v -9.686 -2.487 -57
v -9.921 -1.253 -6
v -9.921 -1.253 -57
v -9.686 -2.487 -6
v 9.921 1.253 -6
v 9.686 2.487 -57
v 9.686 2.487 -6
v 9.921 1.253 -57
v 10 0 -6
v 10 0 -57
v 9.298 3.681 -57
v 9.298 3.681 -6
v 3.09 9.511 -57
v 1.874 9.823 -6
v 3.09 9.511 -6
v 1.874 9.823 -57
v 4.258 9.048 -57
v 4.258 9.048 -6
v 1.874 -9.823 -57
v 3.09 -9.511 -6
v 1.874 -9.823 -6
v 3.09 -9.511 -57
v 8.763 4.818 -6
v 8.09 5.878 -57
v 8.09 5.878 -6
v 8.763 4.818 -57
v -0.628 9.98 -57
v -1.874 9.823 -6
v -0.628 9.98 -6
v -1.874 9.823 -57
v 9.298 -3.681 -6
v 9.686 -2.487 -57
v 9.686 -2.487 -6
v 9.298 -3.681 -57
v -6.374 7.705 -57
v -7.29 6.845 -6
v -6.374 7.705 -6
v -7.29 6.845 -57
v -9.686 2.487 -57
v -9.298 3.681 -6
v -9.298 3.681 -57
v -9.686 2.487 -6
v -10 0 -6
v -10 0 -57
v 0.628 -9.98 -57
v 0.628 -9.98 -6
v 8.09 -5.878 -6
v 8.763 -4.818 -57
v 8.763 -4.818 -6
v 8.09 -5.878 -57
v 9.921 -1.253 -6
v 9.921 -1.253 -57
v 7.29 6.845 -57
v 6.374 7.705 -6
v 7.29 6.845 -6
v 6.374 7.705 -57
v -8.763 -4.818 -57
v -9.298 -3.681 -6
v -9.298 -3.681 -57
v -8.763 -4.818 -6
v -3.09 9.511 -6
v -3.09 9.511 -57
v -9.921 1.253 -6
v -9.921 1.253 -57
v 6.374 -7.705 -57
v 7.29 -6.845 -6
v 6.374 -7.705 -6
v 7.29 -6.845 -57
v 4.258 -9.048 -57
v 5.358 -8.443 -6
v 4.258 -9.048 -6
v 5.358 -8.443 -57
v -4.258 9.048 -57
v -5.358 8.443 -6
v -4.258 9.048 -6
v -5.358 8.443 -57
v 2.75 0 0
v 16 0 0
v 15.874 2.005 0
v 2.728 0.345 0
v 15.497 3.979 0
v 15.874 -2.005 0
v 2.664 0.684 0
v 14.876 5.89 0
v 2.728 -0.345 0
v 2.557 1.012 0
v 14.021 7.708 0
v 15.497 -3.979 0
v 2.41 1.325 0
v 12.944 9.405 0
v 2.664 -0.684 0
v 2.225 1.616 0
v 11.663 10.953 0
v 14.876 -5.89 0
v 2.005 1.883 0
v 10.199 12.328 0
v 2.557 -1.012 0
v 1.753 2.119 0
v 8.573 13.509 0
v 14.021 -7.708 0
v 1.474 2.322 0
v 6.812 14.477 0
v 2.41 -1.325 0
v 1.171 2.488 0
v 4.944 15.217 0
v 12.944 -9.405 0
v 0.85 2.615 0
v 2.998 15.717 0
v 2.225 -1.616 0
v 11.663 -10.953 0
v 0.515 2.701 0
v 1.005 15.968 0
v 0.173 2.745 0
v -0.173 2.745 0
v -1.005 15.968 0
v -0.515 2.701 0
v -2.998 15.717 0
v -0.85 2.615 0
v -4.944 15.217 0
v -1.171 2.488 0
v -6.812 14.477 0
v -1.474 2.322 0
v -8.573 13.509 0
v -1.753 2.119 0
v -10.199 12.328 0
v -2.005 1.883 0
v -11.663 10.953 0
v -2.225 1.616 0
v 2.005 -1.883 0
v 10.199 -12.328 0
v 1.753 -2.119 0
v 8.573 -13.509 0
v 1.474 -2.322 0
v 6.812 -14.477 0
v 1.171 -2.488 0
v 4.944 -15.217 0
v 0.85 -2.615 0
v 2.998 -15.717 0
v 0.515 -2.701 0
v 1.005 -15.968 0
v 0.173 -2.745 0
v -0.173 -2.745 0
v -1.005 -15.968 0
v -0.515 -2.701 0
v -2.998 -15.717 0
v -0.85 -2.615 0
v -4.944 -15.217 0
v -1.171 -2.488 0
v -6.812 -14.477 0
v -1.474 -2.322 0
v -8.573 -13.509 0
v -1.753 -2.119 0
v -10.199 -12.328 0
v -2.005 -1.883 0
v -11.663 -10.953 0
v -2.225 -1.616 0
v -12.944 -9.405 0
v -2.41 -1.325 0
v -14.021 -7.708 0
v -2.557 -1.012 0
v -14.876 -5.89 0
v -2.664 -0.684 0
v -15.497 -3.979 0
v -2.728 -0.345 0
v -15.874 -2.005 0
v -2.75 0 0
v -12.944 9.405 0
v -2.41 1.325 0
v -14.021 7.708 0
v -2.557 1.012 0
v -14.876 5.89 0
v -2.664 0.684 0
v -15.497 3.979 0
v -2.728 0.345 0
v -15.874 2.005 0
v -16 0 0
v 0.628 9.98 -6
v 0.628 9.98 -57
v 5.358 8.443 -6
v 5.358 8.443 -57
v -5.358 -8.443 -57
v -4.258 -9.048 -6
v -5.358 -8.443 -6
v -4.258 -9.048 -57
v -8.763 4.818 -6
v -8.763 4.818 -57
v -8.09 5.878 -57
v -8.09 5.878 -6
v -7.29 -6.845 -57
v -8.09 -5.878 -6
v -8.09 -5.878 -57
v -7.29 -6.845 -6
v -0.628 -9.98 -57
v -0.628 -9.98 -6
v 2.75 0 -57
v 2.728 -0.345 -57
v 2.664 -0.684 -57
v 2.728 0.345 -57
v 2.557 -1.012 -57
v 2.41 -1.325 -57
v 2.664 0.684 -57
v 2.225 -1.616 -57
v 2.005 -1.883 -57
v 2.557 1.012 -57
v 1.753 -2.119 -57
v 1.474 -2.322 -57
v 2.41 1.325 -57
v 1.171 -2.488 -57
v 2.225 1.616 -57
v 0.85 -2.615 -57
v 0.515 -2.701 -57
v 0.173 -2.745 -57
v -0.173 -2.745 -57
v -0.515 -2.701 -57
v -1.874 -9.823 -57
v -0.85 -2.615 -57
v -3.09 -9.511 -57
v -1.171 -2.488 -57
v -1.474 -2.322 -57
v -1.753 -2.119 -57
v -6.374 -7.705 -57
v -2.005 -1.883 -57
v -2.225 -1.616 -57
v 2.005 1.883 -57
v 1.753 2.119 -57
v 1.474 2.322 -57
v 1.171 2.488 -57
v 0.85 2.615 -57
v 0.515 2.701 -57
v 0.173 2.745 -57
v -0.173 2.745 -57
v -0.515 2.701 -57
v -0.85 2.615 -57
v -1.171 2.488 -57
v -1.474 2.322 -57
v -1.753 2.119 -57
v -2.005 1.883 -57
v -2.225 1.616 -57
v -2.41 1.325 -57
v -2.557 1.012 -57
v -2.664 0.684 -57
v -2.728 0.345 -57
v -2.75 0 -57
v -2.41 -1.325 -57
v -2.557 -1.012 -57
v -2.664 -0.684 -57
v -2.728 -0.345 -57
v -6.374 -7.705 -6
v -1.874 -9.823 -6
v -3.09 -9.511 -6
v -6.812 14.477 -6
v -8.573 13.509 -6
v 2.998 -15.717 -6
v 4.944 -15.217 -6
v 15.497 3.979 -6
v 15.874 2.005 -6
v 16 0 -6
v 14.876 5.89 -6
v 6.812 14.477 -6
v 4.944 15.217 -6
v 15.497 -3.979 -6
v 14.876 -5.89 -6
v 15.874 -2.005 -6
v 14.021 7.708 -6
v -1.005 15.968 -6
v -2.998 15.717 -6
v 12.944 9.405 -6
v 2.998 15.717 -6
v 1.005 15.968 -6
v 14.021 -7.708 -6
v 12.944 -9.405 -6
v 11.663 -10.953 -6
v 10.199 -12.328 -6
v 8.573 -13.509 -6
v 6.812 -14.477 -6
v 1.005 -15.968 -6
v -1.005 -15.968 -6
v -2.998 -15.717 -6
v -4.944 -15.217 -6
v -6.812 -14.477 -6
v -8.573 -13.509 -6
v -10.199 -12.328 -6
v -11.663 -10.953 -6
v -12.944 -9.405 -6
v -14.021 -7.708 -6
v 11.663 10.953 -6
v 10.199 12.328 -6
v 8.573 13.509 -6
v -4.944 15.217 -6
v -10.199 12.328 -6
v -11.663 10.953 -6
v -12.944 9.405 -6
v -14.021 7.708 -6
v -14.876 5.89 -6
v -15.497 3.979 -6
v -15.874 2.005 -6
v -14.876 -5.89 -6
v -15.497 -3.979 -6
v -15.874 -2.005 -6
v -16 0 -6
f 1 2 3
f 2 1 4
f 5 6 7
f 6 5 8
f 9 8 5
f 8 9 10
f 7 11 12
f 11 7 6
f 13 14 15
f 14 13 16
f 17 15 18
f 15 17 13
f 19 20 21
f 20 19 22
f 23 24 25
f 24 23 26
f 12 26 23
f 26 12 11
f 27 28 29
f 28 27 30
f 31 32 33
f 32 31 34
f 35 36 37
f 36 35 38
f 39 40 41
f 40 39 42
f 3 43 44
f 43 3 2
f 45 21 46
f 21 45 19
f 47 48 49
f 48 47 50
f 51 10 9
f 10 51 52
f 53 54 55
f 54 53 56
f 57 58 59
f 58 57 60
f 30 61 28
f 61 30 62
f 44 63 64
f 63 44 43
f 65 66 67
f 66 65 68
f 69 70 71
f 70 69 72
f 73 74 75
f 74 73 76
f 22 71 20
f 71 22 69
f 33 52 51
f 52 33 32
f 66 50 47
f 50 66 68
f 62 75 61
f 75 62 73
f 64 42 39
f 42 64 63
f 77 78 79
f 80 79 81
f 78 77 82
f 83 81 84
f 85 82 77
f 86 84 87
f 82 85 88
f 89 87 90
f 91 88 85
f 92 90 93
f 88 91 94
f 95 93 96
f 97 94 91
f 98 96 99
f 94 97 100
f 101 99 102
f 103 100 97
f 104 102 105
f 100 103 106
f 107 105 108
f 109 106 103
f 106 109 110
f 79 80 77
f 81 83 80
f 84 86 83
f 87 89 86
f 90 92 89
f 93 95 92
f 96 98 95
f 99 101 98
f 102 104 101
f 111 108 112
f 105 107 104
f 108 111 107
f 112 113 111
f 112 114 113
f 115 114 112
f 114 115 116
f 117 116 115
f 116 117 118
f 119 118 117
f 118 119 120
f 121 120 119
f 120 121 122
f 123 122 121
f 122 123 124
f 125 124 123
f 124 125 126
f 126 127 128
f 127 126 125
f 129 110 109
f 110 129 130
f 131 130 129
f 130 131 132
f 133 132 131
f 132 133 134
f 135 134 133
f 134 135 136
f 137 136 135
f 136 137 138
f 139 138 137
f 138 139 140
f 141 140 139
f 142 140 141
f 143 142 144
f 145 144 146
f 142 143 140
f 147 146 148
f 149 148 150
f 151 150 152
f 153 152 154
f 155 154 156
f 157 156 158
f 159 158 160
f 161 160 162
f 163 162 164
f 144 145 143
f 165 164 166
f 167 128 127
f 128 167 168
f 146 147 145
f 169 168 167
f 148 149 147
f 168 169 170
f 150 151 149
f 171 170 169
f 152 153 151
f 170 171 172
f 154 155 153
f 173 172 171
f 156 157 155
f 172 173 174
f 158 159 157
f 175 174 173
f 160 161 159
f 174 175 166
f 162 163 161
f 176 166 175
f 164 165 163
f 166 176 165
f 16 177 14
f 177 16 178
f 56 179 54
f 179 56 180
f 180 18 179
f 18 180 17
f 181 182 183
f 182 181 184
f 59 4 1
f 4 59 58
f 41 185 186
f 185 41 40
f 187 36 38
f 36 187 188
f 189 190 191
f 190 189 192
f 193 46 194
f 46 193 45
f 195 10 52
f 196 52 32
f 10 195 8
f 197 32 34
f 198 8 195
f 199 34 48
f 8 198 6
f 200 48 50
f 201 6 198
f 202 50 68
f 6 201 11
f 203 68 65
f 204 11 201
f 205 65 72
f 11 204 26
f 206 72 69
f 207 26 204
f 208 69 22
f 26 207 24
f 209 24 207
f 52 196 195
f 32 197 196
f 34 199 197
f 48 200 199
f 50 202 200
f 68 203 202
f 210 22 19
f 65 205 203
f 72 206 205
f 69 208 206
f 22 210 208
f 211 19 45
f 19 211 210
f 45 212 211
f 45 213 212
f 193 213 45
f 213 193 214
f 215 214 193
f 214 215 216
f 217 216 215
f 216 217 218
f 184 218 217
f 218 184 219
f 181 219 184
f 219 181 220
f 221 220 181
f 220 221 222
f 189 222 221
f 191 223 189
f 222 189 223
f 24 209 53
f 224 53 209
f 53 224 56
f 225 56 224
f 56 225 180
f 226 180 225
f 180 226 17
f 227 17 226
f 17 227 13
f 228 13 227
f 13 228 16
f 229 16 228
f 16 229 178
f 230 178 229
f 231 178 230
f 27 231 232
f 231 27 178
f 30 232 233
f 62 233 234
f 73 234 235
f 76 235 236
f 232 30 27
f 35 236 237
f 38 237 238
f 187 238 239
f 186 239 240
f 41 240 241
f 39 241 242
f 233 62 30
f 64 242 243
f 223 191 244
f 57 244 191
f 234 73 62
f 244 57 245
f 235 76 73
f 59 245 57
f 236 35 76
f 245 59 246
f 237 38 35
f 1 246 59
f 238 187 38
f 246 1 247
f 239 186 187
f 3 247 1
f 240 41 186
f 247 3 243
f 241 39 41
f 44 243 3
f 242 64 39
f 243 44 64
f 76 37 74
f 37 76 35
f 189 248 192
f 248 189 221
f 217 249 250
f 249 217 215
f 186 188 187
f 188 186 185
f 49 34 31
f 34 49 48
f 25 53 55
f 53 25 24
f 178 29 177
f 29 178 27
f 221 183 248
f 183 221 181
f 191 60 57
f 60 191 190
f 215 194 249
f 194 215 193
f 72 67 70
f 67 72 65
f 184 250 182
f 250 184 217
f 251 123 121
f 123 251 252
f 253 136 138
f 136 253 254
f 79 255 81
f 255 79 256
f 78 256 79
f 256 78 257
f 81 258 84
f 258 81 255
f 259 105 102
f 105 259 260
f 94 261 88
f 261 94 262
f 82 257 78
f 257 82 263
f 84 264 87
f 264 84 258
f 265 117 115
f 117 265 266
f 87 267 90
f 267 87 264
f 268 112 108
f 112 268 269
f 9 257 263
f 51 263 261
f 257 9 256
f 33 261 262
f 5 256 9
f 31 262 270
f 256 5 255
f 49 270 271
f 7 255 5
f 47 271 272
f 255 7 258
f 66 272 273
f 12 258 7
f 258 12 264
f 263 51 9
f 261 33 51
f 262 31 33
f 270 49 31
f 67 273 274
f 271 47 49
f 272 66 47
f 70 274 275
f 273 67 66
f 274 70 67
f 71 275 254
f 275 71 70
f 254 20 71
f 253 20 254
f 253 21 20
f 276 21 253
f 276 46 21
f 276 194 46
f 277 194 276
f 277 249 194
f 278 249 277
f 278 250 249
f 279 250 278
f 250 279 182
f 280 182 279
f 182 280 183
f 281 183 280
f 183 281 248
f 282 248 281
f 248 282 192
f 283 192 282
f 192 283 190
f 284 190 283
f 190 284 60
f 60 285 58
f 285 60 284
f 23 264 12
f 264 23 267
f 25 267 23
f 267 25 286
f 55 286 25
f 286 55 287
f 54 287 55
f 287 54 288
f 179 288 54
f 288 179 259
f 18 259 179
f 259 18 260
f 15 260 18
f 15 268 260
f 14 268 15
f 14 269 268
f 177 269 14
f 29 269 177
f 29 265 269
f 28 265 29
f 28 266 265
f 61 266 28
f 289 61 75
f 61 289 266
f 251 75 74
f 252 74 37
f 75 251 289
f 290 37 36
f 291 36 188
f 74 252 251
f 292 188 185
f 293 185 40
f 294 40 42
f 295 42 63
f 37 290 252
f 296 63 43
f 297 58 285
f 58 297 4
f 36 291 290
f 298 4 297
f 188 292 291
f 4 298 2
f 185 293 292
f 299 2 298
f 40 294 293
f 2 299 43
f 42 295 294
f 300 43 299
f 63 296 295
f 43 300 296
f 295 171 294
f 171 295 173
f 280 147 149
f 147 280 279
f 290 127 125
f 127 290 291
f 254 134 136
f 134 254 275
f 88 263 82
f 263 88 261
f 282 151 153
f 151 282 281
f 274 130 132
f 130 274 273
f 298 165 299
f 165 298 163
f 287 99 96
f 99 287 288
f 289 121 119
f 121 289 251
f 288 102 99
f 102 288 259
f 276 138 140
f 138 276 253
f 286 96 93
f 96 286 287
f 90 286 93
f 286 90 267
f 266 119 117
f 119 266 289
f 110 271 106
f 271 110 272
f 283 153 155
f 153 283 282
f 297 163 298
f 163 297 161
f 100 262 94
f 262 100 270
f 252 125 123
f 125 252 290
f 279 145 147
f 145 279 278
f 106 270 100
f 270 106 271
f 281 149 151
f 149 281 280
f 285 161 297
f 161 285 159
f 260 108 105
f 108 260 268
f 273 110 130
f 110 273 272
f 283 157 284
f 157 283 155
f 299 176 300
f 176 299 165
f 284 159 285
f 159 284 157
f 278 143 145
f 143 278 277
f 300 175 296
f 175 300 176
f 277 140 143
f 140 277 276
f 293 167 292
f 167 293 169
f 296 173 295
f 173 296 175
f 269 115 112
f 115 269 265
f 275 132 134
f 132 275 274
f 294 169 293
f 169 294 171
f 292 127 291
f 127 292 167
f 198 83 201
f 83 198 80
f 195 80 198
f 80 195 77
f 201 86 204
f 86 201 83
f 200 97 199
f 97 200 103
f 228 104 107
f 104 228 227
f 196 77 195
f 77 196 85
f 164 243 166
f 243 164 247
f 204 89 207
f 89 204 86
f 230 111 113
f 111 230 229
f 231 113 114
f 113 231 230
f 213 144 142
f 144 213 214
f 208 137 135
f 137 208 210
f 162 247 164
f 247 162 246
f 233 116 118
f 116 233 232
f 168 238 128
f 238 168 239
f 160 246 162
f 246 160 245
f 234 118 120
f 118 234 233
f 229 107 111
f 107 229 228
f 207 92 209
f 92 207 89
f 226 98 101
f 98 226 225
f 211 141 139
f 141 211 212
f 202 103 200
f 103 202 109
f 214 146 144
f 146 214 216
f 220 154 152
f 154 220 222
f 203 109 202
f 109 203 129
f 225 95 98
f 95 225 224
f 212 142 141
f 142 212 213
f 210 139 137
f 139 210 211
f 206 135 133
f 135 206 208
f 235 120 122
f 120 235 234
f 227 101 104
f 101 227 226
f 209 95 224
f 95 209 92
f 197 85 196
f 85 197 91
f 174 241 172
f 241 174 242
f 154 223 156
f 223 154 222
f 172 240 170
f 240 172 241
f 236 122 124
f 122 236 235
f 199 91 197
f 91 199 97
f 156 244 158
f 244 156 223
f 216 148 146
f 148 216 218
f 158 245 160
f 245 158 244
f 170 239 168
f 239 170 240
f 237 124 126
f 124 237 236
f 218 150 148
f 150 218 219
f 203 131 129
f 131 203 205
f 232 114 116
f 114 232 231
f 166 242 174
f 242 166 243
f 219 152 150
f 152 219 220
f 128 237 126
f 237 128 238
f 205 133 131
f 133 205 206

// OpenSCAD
$fn = 50;


difference() {
	union() {
		translate(v = [0, 0, -57.0000000000]) {
			cylinder(h = 57, r = 10.0000000000);
		}
		translate(v = [0, 0, -6.0000000000]) {
			cylinder(h = 6, r = 16.0000000000);
		}
	}
	union() {
		#translate(v = [0, 0, -57]) {
			cylinder(h = 57, r = 2.7500000000);
		}
	}
}
